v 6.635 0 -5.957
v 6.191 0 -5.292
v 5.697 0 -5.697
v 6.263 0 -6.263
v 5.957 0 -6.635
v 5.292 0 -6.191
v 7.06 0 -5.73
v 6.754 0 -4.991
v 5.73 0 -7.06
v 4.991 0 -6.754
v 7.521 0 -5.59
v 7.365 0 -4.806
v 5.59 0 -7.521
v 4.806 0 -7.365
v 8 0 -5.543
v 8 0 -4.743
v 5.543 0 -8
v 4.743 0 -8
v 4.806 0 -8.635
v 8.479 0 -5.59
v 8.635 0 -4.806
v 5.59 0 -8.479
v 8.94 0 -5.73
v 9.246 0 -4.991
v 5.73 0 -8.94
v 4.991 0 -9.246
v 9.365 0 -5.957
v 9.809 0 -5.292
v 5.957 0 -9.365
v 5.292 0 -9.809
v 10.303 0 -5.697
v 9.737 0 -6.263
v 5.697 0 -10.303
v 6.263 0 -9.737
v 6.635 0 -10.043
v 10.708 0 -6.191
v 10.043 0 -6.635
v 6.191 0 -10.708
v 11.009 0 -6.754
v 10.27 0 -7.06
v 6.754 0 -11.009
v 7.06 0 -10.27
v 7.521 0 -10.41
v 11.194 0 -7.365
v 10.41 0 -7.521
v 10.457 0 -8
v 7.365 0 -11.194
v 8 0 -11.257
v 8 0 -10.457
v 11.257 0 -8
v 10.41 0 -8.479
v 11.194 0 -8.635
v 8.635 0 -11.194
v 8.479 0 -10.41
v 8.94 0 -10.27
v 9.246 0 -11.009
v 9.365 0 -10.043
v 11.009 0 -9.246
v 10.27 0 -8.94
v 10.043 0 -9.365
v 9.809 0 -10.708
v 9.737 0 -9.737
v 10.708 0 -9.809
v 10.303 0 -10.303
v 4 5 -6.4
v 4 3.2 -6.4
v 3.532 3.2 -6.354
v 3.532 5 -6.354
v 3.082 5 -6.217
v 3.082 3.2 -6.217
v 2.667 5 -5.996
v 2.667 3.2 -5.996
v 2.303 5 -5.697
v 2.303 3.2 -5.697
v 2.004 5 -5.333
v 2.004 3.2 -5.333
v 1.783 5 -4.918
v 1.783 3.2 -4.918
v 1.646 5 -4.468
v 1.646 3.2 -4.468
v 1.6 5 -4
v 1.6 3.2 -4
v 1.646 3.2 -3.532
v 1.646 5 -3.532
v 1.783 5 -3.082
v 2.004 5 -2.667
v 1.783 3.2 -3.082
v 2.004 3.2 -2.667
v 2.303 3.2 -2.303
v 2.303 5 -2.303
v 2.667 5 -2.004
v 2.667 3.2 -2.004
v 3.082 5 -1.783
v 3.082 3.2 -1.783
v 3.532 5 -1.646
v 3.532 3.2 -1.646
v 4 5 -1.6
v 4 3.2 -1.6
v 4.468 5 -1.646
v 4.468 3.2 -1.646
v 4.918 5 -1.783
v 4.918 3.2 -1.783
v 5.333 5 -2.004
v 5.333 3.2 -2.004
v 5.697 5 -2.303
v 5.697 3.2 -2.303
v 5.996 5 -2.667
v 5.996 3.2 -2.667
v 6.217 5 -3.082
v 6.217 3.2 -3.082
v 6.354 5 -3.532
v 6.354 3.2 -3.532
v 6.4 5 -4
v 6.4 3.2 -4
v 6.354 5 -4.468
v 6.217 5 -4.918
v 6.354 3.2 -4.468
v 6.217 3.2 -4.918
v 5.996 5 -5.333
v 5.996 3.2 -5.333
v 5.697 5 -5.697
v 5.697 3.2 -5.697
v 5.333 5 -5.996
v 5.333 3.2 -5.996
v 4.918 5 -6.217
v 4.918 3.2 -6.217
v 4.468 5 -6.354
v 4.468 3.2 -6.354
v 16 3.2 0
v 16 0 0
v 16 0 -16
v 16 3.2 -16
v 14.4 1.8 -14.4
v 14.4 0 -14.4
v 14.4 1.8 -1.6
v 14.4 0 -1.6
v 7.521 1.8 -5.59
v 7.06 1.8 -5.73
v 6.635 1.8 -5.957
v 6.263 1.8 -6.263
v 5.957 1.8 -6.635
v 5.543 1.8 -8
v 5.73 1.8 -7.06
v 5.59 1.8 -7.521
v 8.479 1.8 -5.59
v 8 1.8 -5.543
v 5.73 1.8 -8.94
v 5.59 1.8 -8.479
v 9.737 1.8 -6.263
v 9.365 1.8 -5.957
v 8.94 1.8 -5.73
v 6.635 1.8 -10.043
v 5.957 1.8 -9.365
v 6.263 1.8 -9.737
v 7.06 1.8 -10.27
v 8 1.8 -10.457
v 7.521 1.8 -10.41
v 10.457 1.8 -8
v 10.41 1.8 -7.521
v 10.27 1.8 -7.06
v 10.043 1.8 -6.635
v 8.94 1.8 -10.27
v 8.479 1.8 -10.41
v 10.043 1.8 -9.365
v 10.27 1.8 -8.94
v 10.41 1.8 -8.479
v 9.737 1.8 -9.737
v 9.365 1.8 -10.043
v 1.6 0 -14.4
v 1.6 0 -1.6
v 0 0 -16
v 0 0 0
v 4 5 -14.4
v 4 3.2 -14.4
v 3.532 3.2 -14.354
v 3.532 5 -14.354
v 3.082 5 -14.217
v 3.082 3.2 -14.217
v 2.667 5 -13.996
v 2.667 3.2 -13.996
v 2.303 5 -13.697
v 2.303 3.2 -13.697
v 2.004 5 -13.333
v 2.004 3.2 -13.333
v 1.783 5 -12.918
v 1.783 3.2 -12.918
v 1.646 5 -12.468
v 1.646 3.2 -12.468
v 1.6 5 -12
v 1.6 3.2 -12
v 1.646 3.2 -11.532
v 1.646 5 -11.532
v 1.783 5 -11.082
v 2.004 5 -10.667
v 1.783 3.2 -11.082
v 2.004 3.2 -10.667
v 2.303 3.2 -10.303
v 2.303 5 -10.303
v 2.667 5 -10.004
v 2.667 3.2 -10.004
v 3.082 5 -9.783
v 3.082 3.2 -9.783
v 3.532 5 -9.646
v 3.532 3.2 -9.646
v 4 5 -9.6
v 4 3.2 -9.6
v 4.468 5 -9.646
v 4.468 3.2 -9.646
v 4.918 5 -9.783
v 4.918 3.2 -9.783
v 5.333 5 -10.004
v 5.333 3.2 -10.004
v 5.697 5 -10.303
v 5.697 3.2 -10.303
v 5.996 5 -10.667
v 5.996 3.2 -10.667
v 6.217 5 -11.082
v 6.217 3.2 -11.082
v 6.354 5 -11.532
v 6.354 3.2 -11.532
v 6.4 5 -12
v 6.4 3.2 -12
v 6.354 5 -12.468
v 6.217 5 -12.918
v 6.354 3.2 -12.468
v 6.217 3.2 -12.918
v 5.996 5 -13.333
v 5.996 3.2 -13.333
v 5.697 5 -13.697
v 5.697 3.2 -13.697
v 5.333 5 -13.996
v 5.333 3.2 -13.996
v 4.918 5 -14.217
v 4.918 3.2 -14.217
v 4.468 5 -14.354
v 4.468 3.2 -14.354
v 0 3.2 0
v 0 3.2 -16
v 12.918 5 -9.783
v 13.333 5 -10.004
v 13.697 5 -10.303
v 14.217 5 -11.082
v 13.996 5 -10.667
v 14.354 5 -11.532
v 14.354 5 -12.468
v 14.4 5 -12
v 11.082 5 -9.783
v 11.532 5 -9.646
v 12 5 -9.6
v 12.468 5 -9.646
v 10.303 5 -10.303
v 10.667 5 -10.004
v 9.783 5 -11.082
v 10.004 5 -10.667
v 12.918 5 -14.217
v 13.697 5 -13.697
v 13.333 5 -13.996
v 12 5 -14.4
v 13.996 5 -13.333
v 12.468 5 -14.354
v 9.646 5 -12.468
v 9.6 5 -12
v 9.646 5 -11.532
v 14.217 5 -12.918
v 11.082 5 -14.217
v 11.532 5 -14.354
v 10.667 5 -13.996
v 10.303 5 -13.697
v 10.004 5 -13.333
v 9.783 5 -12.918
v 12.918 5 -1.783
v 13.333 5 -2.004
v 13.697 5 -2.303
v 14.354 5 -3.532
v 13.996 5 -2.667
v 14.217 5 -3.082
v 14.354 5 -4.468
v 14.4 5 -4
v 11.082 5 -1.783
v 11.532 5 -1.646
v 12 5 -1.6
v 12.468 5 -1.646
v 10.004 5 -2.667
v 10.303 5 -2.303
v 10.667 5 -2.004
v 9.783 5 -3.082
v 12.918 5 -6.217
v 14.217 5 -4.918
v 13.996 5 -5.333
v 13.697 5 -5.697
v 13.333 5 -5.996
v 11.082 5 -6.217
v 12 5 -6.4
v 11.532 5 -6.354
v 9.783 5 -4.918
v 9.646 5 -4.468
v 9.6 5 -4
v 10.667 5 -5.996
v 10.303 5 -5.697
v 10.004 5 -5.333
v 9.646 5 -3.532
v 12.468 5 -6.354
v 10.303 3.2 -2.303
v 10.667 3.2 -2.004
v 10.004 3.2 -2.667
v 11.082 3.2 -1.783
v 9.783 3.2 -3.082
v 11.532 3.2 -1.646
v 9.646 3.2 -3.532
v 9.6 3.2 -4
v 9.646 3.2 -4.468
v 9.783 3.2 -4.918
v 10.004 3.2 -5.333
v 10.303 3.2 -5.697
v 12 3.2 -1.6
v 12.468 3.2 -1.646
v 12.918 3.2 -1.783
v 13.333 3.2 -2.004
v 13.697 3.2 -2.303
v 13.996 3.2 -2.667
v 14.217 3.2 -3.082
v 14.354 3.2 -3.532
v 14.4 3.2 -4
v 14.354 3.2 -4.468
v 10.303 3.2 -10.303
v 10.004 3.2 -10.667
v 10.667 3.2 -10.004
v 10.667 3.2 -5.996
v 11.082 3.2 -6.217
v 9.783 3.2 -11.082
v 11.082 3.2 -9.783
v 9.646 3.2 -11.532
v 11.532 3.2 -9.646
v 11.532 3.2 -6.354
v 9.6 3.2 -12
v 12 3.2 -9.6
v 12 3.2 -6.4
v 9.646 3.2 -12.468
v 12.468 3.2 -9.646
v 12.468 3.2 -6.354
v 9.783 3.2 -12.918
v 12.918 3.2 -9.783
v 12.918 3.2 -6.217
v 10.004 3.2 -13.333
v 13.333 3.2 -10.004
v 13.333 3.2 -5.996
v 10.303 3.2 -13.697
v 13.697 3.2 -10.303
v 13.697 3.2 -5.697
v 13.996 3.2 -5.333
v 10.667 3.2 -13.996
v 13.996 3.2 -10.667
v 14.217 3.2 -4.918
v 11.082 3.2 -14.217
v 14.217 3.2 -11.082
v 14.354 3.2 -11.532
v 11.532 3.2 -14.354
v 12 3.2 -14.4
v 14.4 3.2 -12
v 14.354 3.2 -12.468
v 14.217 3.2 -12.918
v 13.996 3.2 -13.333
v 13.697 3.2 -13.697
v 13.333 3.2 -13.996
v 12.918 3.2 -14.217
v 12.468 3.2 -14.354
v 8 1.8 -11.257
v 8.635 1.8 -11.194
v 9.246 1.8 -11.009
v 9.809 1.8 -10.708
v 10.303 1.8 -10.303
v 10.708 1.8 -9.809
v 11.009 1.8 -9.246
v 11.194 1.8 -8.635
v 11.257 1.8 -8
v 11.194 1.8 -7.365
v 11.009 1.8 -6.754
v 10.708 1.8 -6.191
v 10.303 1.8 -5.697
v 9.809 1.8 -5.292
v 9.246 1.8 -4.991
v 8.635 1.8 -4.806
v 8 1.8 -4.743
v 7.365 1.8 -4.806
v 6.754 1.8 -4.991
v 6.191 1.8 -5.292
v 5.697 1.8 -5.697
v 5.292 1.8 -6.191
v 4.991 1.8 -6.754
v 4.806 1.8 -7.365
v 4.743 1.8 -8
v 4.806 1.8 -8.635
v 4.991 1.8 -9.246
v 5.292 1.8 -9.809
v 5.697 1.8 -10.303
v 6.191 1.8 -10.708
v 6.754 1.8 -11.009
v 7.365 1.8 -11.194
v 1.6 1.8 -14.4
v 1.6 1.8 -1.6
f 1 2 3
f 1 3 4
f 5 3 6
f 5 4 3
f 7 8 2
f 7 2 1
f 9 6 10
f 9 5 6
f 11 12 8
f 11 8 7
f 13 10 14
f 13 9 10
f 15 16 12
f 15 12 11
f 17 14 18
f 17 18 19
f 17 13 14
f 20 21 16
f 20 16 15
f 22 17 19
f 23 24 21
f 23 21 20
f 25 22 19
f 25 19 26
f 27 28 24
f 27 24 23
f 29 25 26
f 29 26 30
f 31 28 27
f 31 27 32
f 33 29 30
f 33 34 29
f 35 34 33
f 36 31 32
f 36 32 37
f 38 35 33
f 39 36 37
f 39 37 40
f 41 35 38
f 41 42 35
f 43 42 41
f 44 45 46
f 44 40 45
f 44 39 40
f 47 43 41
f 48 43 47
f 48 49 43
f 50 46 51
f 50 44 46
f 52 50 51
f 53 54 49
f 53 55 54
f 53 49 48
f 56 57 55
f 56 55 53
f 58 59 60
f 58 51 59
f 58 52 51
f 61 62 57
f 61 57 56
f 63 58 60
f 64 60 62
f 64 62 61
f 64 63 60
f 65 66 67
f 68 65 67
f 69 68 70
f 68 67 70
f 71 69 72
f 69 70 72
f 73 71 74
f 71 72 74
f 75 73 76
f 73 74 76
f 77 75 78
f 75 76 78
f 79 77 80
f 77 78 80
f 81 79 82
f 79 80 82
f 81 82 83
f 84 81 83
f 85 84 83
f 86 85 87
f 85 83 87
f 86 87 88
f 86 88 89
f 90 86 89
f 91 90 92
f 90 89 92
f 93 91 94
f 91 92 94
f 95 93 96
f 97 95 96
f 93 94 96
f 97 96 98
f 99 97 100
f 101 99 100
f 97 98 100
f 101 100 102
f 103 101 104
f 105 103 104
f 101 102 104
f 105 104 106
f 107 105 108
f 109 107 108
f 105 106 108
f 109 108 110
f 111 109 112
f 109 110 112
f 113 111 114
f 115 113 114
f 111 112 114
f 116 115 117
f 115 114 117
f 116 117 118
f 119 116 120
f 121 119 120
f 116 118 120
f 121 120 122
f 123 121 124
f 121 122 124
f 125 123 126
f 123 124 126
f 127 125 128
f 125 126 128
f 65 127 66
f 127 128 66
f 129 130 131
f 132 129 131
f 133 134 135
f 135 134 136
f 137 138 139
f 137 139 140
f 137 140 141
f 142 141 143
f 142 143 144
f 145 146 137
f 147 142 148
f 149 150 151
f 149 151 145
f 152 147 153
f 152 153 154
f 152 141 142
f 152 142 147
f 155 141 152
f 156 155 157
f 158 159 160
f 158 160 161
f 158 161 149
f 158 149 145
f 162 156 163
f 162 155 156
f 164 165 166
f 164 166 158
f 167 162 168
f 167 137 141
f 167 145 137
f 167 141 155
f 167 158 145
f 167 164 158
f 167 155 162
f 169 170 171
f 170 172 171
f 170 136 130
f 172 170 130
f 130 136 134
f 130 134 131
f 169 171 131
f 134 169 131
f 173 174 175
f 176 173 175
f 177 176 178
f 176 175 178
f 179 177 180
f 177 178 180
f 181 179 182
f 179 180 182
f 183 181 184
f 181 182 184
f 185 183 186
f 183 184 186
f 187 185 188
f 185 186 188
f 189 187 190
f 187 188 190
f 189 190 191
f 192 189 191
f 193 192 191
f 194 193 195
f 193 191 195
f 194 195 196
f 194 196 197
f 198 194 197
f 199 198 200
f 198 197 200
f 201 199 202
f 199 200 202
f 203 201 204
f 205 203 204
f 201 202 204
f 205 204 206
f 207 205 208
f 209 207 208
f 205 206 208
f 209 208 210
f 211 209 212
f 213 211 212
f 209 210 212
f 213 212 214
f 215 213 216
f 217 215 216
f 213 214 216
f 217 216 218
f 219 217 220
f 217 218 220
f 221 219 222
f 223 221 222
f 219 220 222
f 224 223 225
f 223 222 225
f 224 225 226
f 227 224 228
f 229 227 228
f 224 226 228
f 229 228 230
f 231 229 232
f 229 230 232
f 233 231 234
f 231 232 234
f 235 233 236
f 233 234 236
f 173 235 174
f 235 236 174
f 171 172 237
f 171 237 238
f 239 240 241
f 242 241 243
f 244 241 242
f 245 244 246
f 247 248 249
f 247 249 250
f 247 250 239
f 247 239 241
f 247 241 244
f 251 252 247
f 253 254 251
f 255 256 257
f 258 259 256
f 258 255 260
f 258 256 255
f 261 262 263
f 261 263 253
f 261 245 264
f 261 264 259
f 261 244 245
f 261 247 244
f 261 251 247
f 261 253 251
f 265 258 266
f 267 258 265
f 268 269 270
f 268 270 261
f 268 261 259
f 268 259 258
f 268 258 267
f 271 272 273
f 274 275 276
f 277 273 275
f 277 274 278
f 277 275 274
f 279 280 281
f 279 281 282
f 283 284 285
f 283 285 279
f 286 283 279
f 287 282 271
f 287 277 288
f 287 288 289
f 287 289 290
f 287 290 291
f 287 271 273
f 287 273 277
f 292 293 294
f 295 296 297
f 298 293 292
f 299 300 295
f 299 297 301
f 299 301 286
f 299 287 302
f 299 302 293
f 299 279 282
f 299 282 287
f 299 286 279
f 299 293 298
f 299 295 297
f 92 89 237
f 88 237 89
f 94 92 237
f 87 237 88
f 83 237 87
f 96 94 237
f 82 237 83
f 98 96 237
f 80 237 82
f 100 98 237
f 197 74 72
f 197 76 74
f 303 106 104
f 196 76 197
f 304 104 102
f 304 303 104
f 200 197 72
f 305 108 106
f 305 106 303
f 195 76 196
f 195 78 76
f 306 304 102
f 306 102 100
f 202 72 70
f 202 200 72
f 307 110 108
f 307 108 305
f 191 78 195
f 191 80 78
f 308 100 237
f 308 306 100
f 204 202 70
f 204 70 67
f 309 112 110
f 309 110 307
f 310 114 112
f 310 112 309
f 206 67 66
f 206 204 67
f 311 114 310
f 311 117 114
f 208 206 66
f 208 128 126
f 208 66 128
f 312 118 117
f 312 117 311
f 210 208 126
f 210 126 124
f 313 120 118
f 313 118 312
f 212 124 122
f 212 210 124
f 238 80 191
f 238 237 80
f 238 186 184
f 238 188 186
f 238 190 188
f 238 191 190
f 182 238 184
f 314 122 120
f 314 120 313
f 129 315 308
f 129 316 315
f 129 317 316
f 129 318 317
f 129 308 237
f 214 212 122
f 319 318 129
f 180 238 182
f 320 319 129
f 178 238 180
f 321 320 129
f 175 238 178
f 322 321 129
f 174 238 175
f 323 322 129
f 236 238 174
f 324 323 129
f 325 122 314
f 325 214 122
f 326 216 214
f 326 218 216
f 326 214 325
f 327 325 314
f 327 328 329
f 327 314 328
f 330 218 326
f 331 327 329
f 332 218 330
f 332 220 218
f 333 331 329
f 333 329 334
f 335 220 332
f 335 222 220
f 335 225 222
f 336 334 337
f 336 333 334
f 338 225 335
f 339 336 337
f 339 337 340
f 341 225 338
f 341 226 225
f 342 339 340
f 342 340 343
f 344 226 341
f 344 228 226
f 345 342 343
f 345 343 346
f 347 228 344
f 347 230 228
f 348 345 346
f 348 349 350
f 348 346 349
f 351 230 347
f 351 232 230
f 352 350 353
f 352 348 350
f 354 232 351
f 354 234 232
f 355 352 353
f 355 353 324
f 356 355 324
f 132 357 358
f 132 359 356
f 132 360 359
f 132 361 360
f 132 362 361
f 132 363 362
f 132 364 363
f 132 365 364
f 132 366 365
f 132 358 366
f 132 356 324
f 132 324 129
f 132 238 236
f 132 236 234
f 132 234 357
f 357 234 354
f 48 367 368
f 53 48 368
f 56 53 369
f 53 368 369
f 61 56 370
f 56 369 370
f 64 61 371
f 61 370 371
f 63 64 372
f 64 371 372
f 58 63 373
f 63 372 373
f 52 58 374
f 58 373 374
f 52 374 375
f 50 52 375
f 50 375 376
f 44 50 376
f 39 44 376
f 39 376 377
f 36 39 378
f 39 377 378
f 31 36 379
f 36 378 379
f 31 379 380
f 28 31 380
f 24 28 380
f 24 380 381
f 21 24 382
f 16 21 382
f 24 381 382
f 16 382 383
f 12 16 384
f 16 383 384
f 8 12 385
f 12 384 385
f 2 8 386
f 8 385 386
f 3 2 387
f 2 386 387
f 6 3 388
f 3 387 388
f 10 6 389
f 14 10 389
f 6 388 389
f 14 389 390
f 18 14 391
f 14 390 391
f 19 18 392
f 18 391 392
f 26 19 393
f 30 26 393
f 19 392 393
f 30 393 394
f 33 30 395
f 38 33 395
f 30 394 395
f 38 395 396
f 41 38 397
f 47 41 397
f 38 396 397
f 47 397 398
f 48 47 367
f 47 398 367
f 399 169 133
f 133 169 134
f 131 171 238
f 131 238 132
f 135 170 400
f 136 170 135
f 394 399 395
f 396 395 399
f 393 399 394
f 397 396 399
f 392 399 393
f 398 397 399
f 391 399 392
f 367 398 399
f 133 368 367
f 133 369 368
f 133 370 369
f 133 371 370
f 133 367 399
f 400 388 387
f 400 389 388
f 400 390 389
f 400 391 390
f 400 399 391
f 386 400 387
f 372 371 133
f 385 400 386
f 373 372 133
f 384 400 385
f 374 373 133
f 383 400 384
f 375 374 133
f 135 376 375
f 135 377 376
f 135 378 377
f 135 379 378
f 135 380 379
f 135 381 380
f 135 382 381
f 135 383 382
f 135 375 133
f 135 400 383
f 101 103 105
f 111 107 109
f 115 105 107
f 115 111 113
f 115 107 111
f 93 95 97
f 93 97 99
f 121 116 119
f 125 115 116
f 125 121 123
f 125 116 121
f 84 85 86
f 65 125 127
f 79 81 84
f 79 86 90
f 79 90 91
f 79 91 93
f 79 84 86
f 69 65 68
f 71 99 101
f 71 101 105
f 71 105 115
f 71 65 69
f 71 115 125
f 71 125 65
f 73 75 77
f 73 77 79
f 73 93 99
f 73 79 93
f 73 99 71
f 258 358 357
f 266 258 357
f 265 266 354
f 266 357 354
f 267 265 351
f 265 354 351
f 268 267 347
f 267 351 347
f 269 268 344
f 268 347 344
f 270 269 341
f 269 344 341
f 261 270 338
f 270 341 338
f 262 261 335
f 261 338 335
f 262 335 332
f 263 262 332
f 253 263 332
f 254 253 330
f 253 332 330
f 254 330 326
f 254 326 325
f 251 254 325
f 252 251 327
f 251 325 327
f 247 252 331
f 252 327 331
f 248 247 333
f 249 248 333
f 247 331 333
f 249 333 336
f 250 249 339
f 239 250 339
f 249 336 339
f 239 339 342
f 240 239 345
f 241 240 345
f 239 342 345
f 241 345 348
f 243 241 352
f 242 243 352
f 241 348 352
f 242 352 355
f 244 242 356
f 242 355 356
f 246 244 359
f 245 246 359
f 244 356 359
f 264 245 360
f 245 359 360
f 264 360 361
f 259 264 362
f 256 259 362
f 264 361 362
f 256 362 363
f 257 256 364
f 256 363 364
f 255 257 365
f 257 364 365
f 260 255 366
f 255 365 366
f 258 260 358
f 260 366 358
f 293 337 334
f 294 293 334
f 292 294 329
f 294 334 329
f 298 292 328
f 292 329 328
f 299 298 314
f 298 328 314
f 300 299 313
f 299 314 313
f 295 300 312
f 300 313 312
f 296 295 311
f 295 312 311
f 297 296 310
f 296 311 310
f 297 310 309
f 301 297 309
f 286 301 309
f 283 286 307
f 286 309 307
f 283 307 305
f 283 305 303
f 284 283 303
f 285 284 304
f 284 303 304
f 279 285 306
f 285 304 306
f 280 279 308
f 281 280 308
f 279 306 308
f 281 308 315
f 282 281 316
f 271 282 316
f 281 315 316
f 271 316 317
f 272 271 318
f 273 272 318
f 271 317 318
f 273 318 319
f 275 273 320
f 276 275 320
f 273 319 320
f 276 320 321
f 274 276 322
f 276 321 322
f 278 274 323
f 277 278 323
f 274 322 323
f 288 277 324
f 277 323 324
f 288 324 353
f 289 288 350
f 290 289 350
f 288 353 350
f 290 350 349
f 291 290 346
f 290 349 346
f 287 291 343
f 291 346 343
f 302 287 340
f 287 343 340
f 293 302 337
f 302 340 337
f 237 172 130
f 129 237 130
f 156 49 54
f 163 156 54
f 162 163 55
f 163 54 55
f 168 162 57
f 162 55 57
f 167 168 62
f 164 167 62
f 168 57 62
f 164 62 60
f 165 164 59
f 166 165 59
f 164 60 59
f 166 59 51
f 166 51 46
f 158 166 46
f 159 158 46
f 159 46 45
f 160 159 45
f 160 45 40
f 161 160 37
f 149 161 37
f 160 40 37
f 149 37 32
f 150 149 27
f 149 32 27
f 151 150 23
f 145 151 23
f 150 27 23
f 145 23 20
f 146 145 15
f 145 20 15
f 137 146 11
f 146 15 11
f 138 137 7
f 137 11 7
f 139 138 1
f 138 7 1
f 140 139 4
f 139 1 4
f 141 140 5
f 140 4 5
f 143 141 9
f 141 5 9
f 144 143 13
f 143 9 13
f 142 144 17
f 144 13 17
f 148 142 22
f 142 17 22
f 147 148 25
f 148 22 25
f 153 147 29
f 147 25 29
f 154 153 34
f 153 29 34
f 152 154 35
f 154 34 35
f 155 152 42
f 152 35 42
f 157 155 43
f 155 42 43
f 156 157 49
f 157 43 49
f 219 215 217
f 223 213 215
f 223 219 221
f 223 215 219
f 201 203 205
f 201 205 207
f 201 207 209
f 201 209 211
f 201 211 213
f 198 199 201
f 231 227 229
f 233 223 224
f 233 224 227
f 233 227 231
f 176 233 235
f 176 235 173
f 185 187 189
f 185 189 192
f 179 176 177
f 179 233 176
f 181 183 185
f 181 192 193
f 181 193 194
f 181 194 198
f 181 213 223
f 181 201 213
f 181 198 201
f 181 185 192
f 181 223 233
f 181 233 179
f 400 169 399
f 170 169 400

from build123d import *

# Parameters (mm, degrees)
SKETCH1_W           = 16
SKETCH1_H           = 16
BOSS_EXTRUDE1_DEPTH = 3.2
SKETCH2_R           = 2.4
BOSS_EXTRUDE2_DEPTH = 1.8
SKETCH3_W           = 12.8
SKETCH3_H           = 12.8
CUT_EXTRUDE1_DEPTH  = 1.8
SKETCH4_R           = 3.25685425
BOSS_EXTRUDE3_DEPTH = 1.8
SKETCH5_R           = 2.45685425
CUT_EXTRUDE2_DEPTH  = 1.8


with BuildPart() as part:
    # Sketch1 → Boss-Extrude1 (new body)
    with BuildSketch(Plane(origin=(0, 0, 0), x_dir=(1, 0, 0), z_dir=(0, 1, 0))):
        with Locations((8, 8)):
            Rectangle(SKETCH1_W, SKETCH1_H)
    extrude(amount=BOSS_EXTRUDE1_DEPTH)

    # Sketch2 → Boss-Extrude2 (add)
    with BuildSketch(Plane(origin=(0, 3.2, 0), x_dir=(1, 0, 0), z_dir=(0, 1, 0))):
        with Locations((4, 12)):
            Circle(SKETCH2_R)
        with Locations((12, 12)):
            Circle(SKETCH2_R)
        with Locations((12, 4)):
            Circle(SKETCH2_R)
        with Locations((4, 4)):
            Circle(SKETCH2_R)
    extrude(amount=BOSS_EXTRUDE2_DEPTH)

    # Sketch3 → Cut-Extrude1 (cut)
    with BuildSketch(Plane.XZ):
        with Locations((8, -8)):
            Rectangle(SKETCH3_W, SKETCH3_H)
    extrude(amount=-CUT_EXTRUDE1_DEPTH, mode=Mode.SUBTRACT)

    # Sketch4 → Boss-Extrude3 (add)
    with BuildSketch(Plane.XZ.offset(-1.8)):
        with Locations((8, -8)):
            Circle(SKETCH4_R)
    extrude(amount=BOSS_EXTRUDE3_DEPTH)

    # Sketch5 → Cut-Extrude2 (cut)
    with BuildSketch(Plane.XZ):
        with Locations((8, -8)):
            Circle(SKETCH5_R)
    extrude(amount=-CUT_EXTRUDE2_DEPTH, mode=Mode.SUBTRACT)


solid = part.part
